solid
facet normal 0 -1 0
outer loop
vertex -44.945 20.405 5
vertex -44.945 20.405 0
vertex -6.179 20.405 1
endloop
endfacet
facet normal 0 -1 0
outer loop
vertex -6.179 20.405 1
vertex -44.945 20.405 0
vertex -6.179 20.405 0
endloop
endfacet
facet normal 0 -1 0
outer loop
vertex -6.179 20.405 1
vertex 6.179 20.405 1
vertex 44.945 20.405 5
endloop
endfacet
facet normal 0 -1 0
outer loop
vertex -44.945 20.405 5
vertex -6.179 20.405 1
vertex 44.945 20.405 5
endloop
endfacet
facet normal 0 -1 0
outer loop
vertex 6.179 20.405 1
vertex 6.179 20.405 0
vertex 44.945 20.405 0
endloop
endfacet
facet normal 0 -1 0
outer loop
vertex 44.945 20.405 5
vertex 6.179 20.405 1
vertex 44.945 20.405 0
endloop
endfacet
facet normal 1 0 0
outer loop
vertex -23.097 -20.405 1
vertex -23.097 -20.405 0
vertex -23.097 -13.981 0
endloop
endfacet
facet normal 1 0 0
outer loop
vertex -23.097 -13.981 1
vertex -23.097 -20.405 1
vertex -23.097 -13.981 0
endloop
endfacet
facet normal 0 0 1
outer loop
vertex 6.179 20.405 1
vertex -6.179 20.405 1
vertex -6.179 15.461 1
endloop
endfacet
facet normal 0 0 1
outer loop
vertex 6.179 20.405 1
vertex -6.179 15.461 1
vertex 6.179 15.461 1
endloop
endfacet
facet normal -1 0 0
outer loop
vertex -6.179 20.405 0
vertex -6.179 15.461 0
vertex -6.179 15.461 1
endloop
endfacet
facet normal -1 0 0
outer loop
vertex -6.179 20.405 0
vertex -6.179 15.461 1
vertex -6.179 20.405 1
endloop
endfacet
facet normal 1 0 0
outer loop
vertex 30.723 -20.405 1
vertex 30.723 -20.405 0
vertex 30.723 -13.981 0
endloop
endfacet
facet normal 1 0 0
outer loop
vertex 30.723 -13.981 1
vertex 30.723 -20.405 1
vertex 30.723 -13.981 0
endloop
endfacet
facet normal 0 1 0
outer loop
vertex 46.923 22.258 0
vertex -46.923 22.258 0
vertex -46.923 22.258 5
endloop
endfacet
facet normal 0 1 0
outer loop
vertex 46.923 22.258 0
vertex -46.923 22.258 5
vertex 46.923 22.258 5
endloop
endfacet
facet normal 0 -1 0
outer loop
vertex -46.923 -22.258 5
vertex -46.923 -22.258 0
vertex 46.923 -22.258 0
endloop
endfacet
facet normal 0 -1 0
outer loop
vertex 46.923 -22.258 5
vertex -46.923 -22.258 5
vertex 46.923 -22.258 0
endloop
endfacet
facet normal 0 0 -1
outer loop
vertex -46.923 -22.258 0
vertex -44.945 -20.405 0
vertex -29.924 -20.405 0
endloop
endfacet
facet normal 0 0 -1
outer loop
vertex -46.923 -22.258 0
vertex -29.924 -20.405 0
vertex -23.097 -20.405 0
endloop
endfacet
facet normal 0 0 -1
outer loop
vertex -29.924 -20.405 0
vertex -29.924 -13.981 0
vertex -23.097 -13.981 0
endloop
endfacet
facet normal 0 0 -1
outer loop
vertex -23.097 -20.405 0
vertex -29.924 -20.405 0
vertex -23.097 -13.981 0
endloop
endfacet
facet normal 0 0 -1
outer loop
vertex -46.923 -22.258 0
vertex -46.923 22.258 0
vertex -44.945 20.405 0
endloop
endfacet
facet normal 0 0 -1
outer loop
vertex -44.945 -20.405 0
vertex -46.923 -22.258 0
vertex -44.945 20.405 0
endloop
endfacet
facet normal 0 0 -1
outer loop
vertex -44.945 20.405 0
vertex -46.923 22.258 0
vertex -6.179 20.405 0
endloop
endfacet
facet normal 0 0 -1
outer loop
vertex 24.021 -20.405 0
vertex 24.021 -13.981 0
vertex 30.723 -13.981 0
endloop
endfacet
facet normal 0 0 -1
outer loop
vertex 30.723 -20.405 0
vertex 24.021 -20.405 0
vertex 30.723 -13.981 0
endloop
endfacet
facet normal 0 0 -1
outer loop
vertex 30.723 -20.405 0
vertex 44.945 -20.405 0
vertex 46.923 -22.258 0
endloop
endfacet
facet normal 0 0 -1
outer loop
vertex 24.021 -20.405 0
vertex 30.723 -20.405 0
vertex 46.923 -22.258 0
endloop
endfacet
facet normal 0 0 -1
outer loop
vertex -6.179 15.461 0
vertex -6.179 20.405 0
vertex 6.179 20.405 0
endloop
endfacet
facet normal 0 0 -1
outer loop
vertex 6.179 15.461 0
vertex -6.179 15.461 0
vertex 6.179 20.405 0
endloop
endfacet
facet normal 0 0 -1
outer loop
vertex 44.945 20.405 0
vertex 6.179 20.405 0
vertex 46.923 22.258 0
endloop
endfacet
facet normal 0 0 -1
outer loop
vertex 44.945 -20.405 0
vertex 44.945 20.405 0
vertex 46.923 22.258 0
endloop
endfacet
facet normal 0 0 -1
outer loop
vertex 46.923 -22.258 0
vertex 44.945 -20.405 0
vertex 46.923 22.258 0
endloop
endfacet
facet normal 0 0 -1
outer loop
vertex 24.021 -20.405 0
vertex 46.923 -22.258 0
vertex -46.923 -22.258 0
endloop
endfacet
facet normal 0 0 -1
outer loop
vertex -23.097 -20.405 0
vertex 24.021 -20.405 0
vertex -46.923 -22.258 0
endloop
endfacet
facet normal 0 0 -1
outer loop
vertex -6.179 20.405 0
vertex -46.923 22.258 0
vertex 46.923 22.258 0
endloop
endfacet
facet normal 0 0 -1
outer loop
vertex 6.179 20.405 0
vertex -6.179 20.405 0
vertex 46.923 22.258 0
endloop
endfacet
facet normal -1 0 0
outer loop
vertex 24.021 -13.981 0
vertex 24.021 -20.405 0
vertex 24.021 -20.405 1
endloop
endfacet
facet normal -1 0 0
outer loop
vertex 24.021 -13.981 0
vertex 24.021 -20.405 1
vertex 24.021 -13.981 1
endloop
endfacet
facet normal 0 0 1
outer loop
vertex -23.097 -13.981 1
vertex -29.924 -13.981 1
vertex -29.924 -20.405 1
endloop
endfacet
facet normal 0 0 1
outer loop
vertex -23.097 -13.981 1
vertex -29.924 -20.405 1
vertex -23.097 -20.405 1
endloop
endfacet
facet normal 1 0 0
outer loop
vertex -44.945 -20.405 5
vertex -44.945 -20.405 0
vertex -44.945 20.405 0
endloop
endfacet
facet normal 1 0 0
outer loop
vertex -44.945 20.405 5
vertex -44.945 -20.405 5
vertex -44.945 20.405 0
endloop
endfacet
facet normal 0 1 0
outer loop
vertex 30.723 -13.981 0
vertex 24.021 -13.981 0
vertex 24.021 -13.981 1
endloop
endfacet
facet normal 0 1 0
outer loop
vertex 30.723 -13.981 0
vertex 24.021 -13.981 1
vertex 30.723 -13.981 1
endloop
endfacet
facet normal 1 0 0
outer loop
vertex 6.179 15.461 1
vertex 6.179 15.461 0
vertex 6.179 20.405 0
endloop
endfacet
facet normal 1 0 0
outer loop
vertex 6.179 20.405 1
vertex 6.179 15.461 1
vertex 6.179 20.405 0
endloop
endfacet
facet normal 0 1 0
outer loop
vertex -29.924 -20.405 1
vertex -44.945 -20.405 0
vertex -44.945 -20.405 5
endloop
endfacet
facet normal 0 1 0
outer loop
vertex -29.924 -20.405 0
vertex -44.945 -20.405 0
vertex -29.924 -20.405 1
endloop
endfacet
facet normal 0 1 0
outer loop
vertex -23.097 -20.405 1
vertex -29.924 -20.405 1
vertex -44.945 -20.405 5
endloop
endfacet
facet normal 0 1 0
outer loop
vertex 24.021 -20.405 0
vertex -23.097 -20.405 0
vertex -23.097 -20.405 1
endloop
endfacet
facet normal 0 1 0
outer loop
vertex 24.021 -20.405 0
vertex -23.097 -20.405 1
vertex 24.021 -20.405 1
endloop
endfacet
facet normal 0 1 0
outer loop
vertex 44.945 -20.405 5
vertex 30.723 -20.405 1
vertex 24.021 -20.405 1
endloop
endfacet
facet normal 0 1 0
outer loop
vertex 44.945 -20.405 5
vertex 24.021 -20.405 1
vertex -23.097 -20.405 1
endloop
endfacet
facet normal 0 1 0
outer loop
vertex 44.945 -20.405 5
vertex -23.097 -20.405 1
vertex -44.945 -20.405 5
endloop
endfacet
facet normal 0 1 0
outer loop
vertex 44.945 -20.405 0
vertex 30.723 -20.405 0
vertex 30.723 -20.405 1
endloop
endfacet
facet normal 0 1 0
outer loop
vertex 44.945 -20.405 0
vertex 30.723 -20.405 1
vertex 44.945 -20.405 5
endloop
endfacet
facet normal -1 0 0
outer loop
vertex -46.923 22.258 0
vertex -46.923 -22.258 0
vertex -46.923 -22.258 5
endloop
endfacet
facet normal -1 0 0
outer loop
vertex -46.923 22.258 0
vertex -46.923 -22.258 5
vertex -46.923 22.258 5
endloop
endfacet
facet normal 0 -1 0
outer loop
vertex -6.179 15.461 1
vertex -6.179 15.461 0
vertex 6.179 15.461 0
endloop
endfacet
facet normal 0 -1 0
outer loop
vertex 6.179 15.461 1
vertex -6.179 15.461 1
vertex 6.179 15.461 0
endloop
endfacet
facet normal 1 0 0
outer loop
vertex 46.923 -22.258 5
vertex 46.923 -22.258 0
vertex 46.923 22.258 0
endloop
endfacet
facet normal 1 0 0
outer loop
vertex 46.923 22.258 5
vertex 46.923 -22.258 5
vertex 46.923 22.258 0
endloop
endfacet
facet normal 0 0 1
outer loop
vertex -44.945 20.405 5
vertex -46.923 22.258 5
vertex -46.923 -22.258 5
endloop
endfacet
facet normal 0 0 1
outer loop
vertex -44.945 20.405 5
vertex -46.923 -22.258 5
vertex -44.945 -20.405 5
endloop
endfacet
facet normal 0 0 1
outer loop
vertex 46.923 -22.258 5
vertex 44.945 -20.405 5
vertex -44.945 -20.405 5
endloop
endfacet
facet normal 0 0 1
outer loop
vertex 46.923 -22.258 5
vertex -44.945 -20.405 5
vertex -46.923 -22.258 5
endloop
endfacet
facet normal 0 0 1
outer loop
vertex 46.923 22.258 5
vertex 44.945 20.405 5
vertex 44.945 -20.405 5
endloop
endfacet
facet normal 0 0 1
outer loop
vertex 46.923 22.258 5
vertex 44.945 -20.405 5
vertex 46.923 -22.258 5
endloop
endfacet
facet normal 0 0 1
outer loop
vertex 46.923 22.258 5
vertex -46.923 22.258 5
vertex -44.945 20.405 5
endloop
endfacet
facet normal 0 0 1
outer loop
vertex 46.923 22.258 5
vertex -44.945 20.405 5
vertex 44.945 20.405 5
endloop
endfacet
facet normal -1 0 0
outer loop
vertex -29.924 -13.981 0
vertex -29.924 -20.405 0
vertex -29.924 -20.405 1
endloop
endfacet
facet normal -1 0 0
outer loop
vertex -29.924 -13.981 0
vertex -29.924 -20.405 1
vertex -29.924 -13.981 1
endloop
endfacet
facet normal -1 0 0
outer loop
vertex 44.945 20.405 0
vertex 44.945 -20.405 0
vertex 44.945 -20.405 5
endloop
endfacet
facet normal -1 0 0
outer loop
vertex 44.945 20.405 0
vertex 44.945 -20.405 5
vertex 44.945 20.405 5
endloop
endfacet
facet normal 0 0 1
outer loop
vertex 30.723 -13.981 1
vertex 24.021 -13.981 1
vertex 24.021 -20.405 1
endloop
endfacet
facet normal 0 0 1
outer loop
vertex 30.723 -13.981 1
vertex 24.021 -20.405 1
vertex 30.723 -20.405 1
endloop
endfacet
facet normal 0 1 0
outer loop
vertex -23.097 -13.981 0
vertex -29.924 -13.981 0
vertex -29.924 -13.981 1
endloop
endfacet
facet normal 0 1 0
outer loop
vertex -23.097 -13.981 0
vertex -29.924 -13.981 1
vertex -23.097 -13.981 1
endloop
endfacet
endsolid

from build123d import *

# Parameters (mm, degrees)
F0_W     = 93.846314
F0_H     = 44.516842
F0_W_2   = 89.889378
F0_H_2   = 40.80934
F1_DEPTH = 5
F2_W     = 12.35856
F2_H     = 6.520443
F2_W_2   = 6.827742
F2_H_2   = 7.738157
F2_W_3   = 6.702413
F2_H_3   = 7.531111
F3_DEPTH = 1


with BuildPart() as f1:
    # F0 (on Top) → F1 (new body)
    with BuildSketch(Plane.XY):
        Rectangle(F0_W, F0_H)
        Rectangle(F0_W_2, F0_H_2, mode=Mode.SUBTRACT)
    extrude(amount=F1_DEPTH)

    # F2 (on Top) → F3 (join)
    with BuildSketch(Plane.XY):
        with Locations((0, 18.721528)):
            Rectangle(F2_W, F2_H)
        with Locations((-26.51052, -17.850101)):
            Rectangle(F2_W_2, F2_H_2)
        with Locations((27.371847, -17.746578)):
            Rectangle(F2_W_3, F2_H_3)
    extrude(amount=F3_DEPTH)


solid = f1.part
